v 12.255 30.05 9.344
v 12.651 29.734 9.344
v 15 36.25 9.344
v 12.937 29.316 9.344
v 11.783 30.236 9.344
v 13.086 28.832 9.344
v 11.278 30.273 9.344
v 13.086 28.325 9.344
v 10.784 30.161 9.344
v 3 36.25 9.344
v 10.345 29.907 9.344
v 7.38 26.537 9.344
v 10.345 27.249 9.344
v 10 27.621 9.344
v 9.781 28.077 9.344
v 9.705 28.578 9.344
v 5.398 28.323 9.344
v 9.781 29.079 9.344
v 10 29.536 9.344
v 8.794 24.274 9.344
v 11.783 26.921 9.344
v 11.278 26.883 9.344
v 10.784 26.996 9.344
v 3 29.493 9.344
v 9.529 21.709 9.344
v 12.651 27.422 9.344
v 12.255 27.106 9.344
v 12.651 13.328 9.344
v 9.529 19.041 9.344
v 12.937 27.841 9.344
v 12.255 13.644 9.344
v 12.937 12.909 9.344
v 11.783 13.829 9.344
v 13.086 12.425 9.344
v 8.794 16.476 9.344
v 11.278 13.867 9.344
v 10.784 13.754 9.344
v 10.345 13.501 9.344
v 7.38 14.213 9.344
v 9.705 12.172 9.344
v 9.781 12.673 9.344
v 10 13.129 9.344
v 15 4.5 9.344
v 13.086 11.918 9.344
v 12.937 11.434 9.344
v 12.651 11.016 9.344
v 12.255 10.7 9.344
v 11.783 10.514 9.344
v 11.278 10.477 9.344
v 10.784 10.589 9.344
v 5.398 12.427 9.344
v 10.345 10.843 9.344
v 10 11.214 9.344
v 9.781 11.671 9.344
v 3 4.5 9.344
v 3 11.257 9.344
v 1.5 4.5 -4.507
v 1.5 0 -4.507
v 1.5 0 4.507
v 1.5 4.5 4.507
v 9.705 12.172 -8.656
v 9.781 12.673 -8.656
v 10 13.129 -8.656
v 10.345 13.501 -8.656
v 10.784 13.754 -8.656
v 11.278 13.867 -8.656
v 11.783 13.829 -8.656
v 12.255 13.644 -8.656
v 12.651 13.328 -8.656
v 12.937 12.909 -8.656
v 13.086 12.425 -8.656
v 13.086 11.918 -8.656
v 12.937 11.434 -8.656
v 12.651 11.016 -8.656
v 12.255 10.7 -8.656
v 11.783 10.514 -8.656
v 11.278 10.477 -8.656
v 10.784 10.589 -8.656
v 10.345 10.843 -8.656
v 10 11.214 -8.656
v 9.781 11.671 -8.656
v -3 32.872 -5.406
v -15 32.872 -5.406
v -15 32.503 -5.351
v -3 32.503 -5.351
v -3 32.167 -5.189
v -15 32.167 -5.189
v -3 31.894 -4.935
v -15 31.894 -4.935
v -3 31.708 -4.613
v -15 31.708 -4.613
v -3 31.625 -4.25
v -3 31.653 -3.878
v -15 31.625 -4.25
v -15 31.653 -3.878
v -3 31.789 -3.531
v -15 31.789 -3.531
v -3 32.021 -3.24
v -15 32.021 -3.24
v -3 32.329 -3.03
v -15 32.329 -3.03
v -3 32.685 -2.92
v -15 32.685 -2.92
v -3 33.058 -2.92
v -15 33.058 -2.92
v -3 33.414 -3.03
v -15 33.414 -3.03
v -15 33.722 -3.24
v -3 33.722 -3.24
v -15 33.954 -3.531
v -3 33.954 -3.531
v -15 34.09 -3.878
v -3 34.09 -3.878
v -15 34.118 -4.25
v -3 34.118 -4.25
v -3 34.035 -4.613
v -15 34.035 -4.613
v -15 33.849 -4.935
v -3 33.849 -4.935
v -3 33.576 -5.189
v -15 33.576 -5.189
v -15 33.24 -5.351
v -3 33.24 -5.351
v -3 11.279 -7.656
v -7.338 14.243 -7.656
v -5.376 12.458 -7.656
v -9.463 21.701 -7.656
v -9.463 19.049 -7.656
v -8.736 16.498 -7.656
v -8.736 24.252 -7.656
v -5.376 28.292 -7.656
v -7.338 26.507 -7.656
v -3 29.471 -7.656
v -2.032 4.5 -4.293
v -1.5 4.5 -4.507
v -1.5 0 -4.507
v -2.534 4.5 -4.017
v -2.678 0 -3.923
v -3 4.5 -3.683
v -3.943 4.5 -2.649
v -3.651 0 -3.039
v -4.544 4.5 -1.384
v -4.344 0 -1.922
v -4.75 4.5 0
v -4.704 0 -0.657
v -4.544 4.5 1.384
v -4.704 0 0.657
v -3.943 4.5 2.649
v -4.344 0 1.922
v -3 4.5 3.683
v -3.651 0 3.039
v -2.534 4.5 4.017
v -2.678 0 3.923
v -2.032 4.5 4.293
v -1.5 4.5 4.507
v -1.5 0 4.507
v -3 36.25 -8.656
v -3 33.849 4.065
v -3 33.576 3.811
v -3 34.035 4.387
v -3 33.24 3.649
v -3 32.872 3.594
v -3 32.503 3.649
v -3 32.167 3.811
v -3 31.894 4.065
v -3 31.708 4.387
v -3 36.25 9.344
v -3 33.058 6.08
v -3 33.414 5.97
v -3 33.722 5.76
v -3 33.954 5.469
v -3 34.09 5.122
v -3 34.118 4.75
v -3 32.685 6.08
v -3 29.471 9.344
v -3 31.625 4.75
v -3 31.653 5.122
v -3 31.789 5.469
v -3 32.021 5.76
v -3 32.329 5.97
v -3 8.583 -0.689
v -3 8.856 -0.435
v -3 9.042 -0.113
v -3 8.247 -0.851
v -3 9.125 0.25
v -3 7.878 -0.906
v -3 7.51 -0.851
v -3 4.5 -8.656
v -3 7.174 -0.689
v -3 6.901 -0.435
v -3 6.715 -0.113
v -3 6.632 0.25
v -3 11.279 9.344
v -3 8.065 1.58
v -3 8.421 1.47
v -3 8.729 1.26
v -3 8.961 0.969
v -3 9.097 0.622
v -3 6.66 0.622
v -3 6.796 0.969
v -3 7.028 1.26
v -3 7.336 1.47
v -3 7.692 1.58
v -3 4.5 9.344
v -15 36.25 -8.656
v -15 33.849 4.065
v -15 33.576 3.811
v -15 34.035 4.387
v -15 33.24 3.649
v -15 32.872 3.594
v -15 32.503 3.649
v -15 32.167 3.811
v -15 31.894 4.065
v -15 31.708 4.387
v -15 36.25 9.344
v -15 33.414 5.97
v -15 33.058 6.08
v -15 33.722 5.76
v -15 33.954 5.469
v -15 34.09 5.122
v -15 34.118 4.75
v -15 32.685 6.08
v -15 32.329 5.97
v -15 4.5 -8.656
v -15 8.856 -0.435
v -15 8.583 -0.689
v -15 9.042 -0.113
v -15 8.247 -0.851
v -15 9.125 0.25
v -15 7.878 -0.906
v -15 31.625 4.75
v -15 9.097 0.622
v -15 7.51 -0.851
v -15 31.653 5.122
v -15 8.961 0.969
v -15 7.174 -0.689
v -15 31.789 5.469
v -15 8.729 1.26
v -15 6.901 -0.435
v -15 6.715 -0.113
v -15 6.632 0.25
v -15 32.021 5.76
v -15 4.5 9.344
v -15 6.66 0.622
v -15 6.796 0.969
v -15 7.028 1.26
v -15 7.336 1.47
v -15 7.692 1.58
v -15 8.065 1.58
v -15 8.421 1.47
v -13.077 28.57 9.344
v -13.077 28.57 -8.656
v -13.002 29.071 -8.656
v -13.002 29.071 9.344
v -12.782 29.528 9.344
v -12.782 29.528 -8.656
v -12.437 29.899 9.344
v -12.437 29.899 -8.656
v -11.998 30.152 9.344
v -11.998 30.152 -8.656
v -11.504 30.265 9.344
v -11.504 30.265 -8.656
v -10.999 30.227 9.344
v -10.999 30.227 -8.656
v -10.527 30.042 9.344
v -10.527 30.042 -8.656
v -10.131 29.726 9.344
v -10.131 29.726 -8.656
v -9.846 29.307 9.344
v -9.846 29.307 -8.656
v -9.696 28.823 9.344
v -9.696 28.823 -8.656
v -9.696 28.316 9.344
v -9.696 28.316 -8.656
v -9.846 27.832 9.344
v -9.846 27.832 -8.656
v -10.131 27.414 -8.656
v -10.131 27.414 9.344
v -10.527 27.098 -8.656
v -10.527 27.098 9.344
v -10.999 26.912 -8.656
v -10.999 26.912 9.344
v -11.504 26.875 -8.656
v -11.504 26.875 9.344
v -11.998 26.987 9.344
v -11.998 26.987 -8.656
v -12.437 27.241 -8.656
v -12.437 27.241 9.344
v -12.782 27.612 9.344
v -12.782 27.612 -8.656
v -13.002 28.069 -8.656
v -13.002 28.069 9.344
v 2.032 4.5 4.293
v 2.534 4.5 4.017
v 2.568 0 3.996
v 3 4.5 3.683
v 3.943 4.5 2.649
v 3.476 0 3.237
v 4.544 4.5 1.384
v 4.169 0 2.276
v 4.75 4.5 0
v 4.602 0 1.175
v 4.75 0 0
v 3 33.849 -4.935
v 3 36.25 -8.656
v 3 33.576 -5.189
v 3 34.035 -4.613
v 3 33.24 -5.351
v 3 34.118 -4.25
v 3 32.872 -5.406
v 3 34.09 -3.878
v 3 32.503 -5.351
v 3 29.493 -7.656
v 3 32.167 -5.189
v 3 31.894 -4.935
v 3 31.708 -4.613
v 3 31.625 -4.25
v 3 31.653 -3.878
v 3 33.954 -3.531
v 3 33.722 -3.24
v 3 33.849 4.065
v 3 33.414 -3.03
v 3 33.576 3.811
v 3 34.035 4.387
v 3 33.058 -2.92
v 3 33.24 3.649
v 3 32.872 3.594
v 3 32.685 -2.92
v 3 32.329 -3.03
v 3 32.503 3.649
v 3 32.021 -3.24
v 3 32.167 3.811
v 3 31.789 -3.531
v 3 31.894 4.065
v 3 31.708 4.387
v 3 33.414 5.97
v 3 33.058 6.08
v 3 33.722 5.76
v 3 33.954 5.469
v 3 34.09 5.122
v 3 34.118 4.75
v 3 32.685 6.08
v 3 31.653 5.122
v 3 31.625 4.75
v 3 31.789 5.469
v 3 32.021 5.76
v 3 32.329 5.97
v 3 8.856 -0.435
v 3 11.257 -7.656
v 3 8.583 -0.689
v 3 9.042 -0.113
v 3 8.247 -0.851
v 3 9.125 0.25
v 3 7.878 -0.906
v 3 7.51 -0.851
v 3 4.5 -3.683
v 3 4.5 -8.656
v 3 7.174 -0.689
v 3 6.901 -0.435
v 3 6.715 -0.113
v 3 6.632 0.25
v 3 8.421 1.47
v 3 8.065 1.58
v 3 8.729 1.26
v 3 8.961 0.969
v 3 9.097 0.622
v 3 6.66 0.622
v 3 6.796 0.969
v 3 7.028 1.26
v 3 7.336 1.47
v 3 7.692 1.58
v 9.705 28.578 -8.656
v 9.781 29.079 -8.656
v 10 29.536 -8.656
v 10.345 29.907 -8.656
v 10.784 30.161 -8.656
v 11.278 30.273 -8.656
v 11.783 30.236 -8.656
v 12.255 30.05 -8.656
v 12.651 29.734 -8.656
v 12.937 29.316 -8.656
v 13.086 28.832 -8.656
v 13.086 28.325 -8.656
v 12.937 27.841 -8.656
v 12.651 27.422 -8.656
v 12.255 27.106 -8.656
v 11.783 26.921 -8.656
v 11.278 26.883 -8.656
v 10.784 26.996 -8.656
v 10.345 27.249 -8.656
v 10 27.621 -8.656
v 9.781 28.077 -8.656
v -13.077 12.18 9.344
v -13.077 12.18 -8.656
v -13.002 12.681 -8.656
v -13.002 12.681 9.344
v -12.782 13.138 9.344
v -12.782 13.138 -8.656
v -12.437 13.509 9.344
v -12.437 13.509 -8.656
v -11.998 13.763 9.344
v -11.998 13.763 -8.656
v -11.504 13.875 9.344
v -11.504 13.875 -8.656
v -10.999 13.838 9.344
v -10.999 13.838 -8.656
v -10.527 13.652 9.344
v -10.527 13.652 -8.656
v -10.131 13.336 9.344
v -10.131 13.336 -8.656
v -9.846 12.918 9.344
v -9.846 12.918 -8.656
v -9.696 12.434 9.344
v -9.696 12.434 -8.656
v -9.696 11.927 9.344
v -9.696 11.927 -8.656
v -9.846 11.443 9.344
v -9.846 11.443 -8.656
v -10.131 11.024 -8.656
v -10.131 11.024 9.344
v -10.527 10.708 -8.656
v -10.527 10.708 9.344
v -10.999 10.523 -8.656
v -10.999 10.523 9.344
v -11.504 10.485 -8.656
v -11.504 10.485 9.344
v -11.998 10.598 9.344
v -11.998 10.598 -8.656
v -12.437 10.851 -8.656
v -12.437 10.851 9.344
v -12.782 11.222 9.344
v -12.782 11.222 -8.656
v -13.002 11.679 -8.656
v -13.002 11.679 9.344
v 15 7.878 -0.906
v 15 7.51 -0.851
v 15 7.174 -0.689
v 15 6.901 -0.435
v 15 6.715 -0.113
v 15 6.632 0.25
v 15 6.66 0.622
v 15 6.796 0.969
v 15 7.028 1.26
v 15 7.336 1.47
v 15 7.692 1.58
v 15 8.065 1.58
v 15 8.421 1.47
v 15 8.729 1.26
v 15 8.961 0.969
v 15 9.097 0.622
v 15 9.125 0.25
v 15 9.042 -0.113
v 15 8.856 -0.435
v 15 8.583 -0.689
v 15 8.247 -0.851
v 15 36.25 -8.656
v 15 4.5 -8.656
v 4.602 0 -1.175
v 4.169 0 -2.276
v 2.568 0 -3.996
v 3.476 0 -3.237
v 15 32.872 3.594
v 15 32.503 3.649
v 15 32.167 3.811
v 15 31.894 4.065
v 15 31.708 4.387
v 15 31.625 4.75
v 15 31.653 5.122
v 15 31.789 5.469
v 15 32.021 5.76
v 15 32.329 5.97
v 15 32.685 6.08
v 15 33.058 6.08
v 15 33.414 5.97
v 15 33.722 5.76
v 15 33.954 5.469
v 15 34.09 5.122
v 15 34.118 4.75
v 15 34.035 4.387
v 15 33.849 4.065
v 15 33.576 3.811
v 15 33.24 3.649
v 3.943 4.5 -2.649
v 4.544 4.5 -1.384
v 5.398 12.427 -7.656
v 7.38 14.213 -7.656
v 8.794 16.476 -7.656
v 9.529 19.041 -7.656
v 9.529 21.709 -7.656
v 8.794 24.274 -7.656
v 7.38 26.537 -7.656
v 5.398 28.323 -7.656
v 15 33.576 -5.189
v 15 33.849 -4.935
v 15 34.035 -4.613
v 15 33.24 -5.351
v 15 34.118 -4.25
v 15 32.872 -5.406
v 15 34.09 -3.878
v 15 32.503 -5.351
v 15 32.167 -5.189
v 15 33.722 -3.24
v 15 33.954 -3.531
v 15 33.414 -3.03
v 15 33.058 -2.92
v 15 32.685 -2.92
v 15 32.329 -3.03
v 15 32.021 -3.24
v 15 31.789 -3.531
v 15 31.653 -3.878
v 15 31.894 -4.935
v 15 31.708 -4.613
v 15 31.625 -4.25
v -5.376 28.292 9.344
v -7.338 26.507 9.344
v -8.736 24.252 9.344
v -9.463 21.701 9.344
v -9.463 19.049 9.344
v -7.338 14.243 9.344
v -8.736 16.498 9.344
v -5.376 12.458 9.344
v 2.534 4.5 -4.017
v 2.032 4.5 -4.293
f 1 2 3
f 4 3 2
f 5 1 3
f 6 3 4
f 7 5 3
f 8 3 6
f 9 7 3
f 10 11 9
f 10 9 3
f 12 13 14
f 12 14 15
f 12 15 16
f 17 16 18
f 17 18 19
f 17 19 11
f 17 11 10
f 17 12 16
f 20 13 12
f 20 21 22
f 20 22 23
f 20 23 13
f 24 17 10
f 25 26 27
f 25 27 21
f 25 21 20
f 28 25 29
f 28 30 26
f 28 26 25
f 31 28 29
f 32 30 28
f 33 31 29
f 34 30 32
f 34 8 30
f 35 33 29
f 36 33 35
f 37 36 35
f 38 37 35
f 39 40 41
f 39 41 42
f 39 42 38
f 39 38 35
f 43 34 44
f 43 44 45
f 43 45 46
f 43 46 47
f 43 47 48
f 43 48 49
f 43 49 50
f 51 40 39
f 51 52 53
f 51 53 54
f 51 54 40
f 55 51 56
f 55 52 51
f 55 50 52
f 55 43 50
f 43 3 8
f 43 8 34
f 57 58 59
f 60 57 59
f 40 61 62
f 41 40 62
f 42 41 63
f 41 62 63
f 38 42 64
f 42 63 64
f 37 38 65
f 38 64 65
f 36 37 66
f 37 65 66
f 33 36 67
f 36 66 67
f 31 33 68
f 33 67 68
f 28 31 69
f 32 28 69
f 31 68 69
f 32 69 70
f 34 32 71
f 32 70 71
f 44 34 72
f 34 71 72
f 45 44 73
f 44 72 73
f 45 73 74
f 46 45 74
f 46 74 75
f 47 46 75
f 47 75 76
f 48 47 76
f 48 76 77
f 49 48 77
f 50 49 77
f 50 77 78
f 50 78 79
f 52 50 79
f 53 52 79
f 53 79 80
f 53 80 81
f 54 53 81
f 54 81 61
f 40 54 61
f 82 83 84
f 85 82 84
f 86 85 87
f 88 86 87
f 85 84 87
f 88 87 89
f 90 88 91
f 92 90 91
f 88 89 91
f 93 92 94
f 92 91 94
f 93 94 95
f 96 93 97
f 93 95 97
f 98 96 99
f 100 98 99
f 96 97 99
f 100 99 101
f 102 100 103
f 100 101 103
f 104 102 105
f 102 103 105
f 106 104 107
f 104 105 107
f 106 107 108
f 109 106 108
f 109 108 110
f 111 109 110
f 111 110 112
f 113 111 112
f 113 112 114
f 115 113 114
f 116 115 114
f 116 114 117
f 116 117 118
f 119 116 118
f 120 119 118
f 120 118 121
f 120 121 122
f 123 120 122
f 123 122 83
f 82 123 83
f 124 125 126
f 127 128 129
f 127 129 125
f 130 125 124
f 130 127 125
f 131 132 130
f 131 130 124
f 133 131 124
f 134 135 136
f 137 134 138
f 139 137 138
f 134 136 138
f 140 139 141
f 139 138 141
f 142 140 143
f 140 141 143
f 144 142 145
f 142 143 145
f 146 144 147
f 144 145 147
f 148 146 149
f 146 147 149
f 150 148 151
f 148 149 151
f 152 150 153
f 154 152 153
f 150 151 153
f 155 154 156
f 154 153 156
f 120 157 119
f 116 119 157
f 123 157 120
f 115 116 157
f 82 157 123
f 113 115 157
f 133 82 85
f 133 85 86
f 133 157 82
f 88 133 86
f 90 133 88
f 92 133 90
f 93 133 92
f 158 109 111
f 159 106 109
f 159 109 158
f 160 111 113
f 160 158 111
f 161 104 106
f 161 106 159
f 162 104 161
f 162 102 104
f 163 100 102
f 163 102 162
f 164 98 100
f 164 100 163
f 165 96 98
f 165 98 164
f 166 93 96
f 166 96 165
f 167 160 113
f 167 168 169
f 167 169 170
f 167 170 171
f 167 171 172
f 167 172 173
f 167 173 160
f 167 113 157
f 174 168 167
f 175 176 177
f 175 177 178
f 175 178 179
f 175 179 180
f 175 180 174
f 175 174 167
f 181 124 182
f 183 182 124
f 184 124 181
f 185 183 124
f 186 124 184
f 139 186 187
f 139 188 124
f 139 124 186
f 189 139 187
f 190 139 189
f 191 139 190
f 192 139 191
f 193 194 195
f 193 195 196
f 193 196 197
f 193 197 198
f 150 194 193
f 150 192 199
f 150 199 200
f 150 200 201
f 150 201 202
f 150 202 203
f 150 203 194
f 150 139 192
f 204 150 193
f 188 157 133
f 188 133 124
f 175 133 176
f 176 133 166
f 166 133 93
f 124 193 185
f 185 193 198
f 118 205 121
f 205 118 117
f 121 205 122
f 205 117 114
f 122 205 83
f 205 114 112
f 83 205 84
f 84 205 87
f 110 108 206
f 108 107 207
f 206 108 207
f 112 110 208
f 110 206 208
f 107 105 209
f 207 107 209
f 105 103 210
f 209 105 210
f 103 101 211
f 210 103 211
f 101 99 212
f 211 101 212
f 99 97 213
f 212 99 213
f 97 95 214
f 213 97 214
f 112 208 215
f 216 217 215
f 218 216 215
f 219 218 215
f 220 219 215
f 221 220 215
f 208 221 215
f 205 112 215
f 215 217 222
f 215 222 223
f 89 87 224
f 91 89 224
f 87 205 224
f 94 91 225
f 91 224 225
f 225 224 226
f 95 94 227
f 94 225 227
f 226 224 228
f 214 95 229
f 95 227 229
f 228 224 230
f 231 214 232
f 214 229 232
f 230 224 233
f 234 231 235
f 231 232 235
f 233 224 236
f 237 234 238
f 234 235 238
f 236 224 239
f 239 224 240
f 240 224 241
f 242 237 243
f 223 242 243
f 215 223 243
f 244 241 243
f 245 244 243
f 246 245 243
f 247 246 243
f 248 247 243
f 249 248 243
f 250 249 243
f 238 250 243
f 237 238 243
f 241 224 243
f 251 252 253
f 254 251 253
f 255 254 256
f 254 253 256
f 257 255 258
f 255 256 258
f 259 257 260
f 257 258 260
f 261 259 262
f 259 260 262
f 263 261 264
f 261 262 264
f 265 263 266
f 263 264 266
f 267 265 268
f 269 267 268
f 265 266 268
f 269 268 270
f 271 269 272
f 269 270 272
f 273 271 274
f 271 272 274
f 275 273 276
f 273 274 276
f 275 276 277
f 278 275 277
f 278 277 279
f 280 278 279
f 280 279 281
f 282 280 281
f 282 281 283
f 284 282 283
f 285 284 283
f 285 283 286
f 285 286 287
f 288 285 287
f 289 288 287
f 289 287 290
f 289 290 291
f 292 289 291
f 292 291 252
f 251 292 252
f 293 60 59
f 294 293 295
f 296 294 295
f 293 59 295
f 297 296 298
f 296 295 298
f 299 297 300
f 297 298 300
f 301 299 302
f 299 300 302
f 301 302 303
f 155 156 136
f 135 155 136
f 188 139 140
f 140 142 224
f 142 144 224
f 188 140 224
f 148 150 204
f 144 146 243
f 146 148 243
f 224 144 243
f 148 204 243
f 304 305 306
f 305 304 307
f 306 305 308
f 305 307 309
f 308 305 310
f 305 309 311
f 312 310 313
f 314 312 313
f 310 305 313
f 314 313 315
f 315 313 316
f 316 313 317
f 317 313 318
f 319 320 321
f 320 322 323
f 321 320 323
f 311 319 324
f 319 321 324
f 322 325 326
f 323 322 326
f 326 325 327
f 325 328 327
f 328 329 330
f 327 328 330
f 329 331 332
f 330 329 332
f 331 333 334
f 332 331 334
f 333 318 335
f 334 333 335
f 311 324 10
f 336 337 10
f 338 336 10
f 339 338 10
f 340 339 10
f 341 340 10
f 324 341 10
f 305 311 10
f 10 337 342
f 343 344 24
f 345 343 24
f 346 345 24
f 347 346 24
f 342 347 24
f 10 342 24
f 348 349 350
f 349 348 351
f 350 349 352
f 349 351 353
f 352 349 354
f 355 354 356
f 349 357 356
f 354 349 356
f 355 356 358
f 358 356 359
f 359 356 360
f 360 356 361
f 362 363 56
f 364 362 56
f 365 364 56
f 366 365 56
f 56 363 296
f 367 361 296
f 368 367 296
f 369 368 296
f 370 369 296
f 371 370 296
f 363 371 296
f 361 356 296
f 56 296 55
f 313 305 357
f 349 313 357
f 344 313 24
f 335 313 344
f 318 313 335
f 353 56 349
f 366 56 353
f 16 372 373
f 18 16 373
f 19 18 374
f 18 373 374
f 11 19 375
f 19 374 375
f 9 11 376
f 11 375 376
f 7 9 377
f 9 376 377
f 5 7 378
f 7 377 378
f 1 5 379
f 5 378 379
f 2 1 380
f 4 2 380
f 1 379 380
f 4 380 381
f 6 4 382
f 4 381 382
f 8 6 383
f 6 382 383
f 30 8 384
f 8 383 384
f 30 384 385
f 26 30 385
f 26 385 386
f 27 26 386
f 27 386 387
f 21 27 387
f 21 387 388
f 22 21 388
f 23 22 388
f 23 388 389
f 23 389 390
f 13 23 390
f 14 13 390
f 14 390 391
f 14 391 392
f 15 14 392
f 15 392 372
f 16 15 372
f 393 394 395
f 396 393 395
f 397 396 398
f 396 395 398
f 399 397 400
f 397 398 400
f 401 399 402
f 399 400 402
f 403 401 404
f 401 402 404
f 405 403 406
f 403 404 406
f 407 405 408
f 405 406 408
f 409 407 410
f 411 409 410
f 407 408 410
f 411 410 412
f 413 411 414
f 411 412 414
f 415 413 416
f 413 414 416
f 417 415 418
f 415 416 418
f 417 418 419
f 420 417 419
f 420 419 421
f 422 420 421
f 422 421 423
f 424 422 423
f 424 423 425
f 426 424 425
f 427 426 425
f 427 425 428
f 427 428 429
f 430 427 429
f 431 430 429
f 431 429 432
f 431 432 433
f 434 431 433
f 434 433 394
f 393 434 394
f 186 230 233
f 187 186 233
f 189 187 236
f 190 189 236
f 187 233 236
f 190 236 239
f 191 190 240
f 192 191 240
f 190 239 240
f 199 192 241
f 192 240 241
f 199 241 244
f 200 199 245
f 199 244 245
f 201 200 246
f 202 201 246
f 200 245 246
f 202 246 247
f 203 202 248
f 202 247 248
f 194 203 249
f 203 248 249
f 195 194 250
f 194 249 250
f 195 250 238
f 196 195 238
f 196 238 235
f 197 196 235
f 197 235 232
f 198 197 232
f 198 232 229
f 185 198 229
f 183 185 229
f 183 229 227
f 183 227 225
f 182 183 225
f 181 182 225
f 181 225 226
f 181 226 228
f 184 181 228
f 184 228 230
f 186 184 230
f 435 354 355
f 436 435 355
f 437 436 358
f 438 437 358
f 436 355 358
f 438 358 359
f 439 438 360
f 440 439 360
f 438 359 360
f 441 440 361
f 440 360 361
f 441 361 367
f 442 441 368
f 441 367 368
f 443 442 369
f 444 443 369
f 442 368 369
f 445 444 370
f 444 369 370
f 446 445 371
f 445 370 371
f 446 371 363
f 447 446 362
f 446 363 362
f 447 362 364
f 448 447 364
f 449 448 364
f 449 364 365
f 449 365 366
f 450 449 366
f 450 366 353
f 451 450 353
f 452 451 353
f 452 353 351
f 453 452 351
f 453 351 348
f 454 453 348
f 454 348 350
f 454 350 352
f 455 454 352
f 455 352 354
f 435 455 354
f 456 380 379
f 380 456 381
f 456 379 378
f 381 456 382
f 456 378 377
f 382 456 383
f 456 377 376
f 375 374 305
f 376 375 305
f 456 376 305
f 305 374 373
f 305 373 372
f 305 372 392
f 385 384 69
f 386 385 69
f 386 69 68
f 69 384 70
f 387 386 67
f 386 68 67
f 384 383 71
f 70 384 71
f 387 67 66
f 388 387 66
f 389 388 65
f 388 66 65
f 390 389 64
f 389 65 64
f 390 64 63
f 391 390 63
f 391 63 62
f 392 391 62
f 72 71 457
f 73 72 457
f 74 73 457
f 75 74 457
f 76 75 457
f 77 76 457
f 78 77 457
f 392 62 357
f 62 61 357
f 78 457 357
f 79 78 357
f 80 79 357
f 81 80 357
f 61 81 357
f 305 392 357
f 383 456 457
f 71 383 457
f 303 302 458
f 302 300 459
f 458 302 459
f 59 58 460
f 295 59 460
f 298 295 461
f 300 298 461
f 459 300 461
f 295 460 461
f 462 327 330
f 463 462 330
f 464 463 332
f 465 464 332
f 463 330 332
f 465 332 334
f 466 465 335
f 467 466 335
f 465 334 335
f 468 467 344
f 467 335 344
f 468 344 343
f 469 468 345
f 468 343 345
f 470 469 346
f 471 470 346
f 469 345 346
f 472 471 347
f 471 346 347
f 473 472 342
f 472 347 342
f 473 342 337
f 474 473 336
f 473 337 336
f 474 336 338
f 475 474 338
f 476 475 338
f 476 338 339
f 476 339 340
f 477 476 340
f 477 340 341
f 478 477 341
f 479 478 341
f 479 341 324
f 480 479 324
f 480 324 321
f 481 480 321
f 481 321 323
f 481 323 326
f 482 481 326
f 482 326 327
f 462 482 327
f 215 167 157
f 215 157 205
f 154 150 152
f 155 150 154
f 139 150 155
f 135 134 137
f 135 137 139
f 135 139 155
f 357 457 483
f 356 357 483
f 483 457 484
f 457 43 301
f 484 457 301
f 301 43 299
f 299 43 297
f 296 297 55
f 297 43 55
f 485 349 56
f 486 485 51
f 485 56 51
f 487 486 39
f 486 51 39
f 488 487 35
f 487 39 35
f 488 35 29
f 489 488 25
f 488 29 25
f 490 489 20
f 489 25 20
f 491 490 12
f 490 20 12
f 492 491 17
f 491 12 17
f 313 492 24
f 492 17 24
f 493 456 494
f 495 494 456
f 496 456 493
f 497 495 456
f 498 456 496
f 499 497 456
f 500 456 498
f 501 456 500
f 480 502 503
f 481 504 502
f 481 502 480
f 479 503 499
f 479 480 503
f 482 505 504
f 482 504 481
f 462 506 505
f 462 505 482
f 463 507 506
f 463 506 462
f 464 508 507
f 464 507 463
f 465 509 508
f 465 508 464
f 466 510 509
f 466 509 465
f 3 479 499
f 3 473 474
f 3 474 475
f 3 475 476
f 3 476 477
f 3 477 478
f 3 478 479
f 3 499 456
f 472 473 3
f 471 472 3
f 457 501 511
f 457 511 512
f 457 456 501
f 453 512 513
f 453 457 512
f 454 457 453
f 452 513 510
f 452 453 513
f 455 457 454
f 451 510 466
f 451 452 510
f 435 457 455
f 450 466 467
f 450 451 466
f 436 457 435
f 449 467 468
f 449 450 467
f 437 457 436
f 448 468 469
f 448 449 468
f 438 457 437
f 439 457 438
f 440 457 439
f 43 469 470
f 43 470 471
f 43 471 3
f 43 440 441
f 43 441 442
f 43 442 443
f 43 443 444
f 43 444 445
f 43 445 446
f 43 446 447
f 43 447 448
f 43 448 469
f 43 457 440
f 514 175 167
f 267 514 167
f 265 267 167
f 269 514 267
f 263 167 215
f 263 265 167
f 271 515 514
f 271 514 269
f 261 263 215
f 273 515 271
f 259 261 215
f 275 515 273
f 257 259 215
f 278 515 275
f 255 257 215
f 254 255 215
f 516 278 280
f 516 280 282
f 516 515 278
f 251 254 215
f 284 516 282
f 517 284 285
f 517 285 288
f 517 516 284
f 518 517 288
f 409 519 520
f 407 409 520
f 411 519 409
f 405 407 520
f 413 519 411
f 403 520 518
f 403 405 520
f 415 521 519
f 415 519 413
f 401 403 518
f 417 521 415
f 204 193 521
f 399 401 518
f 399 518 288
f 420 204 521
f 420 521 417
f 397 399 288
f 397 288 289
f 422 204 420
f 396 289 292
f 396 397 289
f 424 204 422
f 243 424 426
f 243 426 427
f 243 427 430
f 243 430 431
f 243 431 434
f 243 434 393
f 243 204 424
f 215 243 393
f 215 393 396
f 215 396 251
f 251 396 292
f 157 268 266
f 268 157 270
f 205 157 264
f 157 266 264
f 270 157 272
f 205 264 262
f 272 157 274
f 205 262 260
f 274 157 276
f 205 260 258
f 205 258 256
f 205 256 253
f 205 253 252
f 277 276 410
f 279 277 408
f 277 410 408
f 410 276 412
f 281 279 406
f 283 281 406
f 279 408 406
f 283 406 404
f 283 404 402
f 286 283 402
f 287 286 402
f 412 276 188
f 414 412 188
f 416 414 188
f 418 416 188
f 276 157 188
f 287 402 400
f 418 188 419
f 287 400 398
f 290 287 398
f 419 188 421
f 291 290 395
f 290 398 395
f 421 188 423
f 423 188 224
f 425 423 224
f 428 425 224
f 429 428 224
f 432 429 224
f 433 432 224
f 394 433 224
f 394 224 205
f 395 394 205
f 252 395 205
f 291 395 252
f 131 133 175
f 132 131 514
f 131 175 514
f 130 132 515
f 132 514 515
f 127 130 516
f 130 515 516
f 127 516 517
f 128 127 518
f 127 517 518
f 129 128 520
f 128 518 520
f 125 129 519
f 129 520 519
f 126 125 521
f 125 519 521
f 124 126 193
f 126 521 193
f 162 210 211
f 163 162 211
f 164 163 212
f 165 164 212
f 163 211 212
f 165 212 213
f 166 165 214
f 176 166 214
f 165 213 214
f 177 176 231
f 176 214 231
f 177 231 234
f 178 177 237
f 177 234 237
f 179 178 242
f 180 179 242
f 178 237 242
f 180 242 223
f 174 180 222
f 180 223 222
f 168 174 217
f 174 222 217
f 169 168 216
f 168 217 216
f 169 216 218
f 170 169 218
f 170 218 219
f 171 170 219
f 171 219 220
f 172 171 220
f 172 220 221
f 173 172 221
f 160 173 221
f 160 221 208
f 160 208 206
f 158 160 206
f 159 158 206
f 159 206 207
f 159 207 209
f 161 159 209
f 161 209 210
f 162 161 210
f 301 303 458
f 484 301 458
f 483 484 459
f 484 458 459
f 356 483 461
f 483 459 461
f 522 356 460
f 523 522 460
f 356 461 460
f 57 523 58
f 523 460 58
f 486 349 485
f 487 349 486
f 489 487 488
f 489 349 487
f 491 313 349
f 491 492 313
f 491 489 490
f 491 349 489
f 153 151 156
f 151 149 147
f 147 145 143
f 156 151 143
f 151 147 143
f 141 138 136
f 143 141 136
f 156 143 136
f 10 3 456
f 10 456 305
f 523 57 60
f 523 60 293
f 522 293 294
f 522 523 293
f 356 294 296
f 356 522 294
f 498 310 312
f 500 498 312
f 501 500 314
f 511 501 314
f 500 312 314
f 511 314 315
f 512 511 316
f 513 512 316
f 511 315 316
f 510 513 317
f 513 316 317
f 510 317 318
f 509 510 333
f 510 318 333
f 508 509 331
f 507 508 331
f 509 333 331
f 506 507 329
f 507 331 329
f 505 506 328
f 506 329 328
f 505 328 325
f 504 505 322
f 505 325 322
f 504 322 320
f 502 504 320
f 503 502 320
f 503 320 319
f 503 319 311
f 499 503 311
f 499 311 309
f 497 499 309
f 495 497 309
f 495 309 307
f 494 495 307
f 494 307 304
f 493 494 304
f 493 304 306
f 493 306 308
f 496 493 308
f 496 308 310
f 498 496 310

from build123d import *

# Parameters (mm, degrees)
SKETCH2_W             = 12
SKETCH2_H             = 18
EXTRUDE1_DEPTH        = 31.75
EXTRUDE1_2_DEPTH      = 31.75
EXTRUDE2_DEPTH        = 4.5
SKETCH4_R             = 9.5885
EXTRUDE3_DEPTH        = 17
M3_CLEARANCE_HOLE1_D  = 3.4
M3X0_5_TAPPED_HOLE1_D = 2.5


with BuildPart() as part:
    # Sketch2 → Extrude1 (new body)
    with BuildSketch(Plane(origin=(0, 4.5, 0), x_dir=(-1, 0, 0), z_dir=(0, 1, 0))):
        with Locations((9, 0.343878918)):
            Rectangle(SKETCH2_W, SKETCH2_H)
    extrude(amount=EXTRUDE1_DEPTH)



with BuildPart() as body_2:
    # Sketch2 → Extrude1 2 (new body)
    with BuildSketch(Plane(origin=(0, 4.5, 0), x_dir=(-1, 0, 0), z_dir=(0, 1, 0))):
        with Locations((-9, 0.343878918)):
            Rectangle(SKETCH2_W, SKETCH2_H)
    extrude(amount=EXTRUDE1_2_DEPTH)


with BuildPart() as part_1:
    add(part.part)

    add(body_2.part)  # Extrude2 merges body 2
    # Sketch1 → Extrude2 (add)
    with BuildSketch(Plane(origin=(0, 0, 0), x_dir=(1, 0, 0), z_dir=(0, 1, 0))):
        with BuildLine():
            ThreePointArc((4.75, 0), (3.852758752, 2.778263846), (1.5, 4.506939094))
            Line((1.5, 4.506939094), (1.5, -4.506939094))
            ThreePointArc((1.5, -4.506939094), (3.852758752, -2.778263846), (4.75, 0))
        make_face()
        with BuildLine():
            Line((-1.5, -4.506939094), (-1.5, 4.506939094))
            ThreePointArc((-1.5, 4.506939094), (-4.75, 0), (-1.5, -4.506939094))
        make_face()
    extrude(amount=EXTRUDE2_DEPTH)

    # Sketch4 → Extrude3 (cut)
    with BuildSketch(Plane.XY.offset(9.343878918)):
        with Locations((0.033766691, 20.375)):
            Circle(SKETCH4_R)
    extrude(amount=-EXTRUDE3_DEPTH, mode=Mode.SUBTRACT)

    # M3 Clearance Hole1 (through all)
    with Locations(Plane(origin=(-11.377218639, 28.569859147, 9.343878918), x_dir=(1, 0, 0), z_dir=(0, 0, 1))):
        with Locations((0, 0), (0, -16.389718294), (22.782225349, -16.398024537), (22.782225349, 0.008306243)):
            Hole(M3_CLEARANCE_HOLE1_D / 2)

    # M3x0.5 Tapped Hole1 (through all)
    with Locations(Plane(origin=(15, 32.871578641, 4.843878918), x_dir=(0, 0, 1), z_dir=(1, 0, 0))):
        with Locations((0, 0), (-9, 0), (-4.5, 24.993157282)):
            Hole(M3X0_5_TAPPED_HOLE1_D / 2)


solid = part_1.part
